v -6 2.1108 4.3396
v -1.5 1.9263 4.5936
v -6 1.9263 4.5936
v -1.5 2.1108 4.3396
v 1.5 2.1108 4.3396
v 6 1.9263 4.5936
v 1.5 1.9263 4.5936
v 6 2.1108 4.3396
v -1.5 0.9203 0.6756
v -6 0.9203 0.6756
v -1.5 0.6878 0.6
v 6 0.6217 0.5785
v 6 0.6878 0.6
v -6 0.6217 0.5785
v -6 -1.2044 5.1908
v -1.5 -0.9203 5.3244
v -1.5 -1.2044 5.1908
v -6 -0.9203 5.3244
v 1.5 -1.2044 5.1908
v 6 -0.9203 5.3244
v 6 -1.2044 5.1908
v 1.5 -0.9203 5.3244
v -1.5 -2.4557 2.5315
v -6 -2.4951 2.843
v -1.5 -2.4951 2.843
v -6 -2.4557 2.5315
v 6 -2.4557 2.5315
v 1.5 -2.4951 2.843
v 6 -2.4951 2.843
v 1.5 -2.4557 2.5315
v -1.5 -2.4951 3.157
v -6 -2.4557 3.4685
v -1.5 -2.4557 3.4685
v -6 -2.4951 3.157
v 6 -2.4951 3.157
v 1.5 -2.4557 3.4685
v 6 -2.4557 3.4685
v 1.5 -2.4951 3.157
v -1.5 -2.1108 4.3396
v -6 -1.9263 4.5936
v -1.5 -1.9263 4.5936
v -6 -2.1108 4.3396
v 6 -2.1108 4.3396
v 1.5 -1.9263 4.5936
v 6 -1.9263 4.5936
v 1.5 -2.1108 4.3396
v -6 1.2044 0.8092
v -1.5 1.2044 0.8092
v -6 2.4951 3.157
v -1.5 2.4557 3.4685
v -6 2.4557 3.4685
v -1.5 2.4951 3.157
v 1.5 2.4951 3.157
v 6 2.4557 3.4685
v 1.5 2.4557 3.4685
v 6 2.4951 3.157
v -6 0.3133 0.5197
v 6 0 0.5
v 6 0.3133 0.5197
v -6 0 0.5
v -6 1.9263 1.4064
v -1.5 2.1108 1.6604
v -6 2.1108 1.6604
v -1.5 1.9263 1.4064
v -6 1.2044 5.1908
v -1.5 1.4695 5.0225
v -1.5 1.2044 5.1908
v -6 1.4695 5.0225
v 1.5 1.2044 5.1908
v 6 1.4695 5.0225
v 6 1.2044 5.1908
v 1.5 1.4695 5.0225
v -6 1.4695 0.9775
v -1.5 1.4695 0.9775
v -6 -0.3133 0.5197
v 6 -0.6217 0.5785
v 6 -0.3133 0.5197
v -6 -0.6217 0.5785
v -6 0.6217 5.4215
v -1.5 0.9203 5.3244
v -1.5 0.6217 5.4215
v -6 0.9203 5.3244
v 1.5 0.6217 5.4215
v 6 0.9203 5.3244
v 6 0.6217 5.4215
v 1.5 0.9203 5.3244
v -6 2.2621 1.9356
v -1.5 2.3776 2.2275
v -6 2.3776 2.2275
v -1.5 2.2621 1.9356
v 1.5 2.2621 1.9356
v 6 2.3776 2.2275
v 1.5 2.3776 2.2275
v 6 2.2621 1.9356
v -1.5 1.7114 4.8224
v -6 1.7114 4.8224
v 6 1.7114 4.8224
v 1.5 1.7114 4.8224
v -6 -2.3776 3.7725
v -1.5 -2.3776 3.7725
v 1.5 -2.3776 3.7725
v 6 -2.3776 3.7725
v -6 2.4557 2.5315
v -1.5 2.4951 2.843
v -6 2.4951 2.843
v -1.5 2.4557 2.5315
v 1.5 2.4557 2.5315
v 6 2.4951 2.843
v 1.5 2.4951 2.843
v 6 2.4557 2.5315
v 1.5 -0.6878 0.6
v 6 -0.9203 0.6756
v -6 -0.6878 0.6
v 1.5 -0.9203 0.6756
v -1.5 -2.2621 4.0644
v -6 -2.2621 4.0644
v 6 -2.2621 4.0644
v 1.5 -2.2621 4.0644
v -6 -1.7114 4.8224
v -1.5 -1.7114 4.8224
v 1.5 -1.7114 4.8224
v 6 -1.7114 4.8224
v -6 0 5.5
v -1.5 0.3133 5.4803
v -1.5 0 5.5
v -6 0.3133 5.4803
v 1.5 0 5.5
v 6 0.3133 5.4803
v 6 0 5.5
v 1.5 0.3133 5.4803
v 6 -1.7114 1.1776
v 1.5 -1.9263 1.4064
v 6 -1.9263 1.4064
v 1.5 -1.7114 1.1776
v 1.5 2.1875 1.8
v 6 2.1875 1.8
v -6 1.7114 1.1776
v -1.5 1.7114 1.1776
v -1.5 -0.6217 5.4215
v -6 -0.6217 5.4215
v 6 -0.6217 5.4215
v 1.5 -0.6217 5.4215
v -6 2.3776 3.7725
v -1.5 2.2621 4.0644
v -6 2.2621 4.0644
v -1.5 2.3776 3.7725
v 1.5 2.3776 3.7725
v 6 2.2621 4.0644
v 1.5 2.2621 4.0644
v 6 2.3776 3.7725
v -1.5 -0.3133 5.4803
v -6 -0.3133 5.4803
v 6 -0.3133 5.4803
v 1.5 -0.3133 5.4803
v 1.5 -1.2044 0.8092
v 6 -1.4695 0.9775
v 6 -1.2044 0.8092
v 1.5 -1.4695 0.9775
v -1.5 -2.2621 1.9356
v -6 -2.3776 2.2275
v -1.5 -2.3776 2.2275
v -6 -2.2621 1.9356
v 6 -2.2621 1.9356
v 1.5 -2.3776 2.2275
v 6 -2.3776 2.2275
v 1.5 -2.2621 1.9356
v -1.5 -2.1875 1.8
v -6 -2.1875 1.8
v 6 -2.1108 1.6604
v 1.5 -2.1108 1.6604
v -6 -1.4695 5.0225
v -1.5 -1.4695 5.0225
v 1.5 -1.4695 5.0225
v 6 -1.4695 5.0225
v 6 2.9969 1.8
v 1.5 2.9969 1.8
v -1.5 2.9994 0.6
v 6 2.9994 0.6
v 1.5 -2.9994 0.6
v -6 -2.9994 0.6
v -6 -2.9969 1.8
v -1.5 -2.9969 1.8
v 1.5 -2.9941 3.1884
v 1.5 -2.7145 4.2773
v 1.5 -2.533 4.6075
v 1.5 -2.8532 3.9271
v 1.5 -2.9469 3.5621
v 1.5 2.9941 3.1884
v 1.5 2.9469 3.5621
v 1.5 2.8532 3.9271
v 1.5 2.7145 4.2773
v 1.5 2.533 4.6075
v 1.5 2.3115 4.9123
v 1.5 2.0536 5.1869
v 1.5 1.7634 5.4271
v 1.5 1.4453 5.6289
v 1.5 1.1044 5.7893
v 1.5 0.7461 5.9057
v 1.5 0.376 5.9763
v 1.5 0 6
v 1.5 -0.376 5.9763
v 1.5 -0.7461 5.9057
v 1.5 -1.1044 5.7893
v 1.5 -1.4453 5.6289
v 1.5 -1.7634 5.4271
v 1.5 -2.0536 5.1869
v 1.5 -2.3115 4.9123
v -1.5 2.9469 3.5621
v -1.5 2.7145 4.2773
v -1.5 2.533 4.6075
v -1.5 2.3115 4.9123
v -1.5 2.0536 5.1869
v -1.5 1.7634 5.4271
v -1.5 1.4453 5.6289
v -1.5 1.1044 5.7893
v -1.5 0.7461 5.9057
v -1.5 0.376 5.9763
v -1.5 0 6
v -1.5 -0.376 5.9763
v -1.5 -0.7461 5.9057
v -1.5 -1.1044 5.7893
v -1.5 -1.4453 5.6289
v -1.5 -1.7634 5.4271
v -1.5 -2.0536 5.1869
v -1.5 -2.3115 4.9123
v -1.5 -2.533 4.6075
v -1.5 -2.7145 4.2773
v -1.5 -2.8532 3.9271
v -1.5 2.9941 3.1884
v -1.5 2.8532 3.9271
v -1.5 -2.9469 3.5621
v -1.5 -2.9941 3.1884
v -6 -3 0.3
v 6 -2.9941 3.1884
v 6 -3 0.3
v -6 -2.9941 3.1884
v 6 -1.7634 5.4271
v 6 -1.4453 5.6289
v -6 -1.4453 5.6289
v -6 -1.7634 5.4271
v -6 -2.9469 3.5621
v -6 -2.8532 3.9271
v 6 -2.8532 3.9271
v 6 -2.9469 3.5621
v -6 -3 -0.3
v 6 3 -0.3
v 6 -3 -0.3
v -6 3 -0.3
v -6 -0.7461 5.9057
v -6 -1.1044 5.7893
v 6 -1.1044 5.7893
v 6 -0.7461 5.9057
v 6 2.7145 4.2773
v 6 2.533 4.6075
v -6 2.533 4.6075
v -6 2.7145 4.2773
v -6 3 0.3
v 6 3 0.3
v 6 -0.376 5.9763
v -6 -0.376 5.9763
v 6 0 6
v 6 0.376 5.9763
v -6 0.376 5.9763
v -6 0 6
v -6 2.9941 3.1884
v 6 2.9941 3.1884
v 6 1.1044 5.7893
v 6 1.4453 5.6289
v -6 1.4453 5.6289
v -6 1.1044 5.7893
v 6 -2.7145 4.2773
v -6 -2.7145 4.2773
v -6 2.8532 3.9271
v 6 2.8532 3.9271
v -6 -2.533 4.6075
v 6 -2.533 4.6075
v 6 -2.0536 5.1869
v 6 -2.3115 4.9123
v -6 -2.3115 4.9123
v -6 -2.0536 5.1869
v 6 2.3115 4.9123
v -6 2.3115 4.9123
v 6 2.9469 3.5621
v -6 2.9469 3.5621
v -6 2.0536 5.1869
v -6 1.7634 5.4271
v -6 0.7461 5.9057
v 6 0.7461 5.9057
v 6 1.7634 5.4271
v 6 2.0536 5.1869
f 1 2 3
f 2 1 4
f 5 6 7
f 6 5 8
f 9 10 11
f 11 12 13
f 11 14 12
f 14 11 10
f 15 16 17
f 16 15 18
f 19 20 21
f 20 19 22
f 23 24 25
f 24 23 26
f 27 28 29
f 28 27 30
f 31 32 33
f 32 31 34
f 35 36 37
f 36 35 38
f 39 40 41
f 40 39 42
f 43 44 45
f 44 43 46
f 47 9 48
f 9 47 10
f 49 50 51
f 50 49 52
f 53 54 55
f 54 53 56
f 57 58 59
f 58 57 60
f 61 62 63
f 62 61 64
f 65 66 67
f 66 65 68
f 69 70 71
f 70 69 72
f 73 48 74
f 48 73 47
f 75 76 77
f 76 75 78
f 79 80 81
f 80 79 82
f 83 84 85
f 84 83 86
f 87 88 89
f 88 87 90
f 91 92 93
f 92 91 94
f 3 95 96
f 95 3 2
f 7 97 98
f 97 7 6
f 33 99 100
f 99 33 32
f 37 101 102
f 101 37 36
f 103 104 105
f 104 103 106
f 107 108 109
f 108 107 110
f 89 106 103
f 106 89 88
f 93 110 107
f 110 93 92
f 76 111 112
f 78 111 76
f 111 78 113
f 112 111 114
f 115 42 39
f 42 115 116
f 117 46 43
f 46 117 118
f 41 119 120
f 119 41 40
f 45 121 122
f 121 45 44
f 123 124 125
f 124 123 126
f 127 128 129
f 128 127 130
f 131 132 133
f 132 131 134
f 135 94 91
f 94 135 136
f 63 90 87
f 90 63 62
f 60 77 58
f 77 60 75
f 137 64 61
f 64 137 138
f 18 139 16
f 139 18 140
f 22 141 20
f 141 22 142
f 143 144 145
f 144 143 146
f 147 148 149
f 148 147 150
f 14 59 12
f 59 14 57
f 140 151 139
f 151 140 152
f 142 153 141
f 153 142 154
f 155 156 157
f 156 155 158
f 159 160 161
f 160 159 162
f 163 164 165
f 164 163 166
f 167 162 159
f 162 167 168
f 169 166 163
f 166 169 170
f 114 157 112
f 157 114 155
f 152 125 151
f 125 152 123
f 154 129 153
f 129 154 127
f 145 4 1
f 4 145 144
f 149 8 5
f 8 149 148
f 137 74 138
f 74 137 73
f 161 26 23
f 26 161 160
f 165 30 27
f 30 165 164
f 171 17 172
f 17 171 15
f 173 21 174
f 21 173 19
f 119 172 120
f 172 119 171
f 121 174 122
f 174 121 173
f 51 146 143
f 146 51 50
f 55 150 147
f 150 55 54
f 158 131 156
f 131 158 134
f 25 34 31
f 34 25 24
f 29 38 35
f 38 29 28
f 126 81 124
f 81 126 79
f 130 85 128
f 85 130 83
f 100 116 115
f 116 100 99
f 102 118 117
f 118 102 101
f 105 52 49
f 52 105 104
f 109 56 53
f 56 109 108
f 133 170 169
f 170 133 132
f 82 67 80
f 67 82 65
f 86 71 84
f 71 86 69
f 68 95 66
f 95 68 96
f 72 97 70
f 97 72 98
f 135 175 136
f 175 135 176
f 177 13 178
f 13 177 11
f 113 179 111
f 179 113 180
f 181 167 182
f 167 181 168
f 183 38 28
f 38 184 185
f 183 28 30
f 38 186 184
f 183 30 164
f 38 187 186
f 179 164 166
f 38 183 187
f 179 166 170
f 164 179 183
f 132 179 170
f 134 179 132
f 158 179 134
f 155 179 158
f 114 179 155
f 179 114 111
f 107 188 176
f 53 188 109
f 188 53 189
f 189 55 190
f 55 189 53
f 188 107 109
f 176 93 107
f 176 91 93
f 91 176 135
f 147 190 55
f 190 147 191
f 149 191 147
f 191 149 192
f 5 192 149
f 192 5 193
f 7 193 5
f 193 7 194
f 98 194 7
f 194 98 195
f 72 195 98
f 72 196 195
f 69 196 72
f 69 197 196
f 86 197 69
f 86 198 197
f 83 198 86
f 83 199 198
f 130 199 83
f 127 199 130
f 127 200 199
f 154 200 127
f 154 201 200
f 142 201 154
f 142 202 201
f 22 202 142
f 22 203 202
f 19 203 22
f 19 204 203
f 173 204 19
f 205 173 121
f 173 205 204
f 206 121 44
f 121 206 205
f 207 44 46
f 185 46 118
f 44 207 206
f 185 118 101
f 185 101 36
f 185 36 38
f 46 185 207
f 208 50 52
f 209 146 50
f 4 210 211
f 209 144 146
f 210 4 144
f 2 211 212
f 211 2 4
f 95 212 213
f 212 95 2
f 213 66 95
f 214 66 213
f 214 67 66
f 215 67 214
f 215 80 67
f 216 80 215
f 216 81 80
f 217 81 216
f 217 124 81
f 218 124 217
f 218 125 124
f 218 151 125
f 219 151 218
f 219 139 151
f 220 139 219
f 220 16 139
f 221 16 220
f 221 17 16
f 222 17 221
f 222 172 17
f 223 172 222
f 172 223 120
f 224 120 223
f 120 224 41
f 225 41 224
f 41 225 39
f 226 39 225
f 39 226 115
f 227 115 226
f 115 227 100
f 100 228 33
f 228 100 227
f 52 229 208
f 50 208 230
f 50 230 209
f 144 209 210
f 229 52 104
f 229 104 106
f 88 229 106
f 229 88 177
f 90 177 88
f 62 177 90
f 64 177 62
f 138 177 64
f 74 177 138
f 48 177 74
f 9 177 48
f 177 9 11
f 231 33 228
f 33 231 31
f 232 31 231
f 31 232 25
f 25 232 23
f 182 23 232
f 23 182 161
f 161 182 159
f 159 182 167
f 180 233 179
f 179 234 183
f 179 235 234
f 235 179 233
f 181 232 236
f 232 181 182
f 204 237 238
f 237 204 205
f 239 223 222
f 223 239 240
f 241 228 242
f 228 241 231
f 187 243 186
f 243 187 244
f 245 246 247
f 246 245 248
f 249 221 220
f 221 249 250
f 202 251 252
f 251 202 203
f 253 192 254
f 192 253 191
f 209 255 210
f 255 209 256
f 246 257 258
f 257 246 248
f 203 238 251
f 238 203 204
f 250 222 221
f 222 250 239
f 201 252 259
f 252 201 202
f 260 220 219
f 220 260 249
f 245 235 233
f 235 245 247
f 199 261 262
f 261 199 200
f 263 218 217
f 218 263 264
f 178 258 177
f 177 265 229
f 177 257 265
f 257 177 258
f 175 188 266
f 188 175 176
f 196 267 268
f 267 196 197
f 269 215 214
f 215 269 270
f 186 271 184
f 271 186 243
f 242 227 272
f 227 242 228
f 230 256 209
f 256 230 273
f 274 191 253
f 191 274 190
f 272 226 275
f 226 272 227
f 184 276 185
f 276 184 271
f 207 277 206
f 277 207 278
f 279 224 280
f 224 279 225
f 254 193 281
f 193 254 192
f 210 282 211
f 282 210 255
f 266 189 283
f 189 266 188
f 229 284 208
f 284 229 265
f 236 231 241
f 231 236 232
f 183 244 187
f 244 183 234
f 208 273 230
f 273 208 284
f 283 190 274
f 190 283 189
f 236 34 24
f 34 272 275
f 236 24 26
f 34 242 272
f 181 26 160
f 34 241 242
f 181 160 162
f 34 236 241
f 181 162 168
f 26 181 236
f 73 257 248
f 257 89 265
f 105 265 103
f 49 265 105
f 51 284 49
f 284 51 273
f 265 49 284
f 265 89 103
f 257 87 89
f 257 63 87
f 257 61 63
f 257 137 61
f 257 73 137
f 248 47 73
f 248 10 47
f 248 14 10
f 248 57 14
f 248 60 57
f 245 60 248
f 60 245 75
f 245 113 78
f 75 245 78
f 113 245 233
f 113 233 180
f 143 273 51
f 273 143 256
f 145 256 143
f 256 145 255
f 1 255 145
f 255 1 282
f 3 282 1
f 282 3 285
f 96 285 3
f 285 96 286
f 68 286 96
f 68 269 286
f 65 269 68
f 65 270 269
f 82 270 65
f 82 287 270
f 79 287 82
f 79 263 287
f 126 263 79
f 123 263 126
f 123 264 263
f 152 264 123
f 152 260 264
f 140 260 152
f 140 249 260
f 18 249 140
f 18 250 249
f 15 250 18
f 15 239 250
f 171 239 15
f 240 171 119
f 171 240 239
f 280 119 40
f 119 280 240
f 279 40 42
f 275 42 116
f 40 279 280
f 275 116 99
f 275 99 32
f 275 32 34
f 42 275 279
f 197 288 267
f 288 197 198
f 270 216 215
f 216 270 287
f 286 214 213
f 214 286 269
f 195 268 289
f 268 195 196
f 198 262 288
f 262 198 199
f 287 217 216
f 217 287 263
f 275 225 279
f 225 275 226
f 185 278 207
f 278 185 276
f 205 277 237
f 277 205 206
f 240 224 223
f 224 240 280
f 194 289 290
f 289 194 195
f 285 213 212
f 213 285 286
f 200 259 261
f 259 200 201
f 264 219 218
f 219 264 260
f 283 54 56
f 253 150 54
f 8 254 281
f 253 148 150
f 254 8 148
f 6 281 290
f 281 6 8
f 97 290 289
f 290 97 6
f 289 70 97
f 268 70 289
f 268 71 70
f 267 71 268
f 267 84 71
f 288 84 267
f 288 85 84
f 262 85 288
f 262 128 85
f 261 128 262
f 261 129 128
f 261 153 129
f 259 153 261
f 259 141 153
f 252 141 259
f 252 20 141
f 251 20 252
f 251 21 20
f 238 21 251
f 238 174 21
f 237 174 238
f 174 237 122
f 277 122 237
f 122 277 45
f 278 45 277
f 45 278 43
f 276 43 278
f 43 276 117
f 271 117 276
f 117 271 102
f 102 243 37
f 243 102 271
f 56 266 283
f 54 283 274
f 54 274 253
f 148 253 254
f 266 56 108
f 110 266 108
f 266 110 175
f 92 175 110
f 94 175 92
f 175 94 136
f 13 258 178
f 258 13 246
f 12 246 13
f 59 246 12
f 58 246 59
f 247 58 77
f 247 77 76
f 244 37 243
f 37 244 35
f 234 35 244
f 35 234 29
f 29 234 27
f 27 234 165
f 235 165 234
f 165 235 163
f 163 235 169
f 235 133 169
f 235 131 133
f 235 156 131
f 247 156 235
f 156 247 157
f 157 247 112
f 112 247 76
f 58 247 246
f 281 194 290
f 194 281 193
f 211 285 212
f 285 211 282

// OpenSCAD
unendlich = 1000;
laenge = 12.0;
breite = 6.0;
hoehe = 0.6;
rloch=2.5;
schlitzbreite = 3;

$fn=50;

difference() {
hull() {
cube(size=[laenge,breite,hoehe], center=true);
translate([-laenge/2,0,breite/2])rotate([0,90,0]) cylinder(h=laenge, r1=breite/2, r2=breite/2);
}
union() {
translate([-unendlich/2,0,breite/2])rotate([0,90,0]) cylinder(h=unendlich, r1=rloch, r2=rloch);
translate([laenge/4+1,breite/2,hoehe*2])cube(size=[laenge/2,breite,hoehe*2], center=true);
translate([-(laenge/4+1),-breite/2,hoehe*2])cube(size=[laenge/2,breite,hoehe*2], center=true);
translate([0,0,unendlich/2+hoehe])cube(size=[schlitzbreite,unendlich,unendlich], center=true);
}
}
